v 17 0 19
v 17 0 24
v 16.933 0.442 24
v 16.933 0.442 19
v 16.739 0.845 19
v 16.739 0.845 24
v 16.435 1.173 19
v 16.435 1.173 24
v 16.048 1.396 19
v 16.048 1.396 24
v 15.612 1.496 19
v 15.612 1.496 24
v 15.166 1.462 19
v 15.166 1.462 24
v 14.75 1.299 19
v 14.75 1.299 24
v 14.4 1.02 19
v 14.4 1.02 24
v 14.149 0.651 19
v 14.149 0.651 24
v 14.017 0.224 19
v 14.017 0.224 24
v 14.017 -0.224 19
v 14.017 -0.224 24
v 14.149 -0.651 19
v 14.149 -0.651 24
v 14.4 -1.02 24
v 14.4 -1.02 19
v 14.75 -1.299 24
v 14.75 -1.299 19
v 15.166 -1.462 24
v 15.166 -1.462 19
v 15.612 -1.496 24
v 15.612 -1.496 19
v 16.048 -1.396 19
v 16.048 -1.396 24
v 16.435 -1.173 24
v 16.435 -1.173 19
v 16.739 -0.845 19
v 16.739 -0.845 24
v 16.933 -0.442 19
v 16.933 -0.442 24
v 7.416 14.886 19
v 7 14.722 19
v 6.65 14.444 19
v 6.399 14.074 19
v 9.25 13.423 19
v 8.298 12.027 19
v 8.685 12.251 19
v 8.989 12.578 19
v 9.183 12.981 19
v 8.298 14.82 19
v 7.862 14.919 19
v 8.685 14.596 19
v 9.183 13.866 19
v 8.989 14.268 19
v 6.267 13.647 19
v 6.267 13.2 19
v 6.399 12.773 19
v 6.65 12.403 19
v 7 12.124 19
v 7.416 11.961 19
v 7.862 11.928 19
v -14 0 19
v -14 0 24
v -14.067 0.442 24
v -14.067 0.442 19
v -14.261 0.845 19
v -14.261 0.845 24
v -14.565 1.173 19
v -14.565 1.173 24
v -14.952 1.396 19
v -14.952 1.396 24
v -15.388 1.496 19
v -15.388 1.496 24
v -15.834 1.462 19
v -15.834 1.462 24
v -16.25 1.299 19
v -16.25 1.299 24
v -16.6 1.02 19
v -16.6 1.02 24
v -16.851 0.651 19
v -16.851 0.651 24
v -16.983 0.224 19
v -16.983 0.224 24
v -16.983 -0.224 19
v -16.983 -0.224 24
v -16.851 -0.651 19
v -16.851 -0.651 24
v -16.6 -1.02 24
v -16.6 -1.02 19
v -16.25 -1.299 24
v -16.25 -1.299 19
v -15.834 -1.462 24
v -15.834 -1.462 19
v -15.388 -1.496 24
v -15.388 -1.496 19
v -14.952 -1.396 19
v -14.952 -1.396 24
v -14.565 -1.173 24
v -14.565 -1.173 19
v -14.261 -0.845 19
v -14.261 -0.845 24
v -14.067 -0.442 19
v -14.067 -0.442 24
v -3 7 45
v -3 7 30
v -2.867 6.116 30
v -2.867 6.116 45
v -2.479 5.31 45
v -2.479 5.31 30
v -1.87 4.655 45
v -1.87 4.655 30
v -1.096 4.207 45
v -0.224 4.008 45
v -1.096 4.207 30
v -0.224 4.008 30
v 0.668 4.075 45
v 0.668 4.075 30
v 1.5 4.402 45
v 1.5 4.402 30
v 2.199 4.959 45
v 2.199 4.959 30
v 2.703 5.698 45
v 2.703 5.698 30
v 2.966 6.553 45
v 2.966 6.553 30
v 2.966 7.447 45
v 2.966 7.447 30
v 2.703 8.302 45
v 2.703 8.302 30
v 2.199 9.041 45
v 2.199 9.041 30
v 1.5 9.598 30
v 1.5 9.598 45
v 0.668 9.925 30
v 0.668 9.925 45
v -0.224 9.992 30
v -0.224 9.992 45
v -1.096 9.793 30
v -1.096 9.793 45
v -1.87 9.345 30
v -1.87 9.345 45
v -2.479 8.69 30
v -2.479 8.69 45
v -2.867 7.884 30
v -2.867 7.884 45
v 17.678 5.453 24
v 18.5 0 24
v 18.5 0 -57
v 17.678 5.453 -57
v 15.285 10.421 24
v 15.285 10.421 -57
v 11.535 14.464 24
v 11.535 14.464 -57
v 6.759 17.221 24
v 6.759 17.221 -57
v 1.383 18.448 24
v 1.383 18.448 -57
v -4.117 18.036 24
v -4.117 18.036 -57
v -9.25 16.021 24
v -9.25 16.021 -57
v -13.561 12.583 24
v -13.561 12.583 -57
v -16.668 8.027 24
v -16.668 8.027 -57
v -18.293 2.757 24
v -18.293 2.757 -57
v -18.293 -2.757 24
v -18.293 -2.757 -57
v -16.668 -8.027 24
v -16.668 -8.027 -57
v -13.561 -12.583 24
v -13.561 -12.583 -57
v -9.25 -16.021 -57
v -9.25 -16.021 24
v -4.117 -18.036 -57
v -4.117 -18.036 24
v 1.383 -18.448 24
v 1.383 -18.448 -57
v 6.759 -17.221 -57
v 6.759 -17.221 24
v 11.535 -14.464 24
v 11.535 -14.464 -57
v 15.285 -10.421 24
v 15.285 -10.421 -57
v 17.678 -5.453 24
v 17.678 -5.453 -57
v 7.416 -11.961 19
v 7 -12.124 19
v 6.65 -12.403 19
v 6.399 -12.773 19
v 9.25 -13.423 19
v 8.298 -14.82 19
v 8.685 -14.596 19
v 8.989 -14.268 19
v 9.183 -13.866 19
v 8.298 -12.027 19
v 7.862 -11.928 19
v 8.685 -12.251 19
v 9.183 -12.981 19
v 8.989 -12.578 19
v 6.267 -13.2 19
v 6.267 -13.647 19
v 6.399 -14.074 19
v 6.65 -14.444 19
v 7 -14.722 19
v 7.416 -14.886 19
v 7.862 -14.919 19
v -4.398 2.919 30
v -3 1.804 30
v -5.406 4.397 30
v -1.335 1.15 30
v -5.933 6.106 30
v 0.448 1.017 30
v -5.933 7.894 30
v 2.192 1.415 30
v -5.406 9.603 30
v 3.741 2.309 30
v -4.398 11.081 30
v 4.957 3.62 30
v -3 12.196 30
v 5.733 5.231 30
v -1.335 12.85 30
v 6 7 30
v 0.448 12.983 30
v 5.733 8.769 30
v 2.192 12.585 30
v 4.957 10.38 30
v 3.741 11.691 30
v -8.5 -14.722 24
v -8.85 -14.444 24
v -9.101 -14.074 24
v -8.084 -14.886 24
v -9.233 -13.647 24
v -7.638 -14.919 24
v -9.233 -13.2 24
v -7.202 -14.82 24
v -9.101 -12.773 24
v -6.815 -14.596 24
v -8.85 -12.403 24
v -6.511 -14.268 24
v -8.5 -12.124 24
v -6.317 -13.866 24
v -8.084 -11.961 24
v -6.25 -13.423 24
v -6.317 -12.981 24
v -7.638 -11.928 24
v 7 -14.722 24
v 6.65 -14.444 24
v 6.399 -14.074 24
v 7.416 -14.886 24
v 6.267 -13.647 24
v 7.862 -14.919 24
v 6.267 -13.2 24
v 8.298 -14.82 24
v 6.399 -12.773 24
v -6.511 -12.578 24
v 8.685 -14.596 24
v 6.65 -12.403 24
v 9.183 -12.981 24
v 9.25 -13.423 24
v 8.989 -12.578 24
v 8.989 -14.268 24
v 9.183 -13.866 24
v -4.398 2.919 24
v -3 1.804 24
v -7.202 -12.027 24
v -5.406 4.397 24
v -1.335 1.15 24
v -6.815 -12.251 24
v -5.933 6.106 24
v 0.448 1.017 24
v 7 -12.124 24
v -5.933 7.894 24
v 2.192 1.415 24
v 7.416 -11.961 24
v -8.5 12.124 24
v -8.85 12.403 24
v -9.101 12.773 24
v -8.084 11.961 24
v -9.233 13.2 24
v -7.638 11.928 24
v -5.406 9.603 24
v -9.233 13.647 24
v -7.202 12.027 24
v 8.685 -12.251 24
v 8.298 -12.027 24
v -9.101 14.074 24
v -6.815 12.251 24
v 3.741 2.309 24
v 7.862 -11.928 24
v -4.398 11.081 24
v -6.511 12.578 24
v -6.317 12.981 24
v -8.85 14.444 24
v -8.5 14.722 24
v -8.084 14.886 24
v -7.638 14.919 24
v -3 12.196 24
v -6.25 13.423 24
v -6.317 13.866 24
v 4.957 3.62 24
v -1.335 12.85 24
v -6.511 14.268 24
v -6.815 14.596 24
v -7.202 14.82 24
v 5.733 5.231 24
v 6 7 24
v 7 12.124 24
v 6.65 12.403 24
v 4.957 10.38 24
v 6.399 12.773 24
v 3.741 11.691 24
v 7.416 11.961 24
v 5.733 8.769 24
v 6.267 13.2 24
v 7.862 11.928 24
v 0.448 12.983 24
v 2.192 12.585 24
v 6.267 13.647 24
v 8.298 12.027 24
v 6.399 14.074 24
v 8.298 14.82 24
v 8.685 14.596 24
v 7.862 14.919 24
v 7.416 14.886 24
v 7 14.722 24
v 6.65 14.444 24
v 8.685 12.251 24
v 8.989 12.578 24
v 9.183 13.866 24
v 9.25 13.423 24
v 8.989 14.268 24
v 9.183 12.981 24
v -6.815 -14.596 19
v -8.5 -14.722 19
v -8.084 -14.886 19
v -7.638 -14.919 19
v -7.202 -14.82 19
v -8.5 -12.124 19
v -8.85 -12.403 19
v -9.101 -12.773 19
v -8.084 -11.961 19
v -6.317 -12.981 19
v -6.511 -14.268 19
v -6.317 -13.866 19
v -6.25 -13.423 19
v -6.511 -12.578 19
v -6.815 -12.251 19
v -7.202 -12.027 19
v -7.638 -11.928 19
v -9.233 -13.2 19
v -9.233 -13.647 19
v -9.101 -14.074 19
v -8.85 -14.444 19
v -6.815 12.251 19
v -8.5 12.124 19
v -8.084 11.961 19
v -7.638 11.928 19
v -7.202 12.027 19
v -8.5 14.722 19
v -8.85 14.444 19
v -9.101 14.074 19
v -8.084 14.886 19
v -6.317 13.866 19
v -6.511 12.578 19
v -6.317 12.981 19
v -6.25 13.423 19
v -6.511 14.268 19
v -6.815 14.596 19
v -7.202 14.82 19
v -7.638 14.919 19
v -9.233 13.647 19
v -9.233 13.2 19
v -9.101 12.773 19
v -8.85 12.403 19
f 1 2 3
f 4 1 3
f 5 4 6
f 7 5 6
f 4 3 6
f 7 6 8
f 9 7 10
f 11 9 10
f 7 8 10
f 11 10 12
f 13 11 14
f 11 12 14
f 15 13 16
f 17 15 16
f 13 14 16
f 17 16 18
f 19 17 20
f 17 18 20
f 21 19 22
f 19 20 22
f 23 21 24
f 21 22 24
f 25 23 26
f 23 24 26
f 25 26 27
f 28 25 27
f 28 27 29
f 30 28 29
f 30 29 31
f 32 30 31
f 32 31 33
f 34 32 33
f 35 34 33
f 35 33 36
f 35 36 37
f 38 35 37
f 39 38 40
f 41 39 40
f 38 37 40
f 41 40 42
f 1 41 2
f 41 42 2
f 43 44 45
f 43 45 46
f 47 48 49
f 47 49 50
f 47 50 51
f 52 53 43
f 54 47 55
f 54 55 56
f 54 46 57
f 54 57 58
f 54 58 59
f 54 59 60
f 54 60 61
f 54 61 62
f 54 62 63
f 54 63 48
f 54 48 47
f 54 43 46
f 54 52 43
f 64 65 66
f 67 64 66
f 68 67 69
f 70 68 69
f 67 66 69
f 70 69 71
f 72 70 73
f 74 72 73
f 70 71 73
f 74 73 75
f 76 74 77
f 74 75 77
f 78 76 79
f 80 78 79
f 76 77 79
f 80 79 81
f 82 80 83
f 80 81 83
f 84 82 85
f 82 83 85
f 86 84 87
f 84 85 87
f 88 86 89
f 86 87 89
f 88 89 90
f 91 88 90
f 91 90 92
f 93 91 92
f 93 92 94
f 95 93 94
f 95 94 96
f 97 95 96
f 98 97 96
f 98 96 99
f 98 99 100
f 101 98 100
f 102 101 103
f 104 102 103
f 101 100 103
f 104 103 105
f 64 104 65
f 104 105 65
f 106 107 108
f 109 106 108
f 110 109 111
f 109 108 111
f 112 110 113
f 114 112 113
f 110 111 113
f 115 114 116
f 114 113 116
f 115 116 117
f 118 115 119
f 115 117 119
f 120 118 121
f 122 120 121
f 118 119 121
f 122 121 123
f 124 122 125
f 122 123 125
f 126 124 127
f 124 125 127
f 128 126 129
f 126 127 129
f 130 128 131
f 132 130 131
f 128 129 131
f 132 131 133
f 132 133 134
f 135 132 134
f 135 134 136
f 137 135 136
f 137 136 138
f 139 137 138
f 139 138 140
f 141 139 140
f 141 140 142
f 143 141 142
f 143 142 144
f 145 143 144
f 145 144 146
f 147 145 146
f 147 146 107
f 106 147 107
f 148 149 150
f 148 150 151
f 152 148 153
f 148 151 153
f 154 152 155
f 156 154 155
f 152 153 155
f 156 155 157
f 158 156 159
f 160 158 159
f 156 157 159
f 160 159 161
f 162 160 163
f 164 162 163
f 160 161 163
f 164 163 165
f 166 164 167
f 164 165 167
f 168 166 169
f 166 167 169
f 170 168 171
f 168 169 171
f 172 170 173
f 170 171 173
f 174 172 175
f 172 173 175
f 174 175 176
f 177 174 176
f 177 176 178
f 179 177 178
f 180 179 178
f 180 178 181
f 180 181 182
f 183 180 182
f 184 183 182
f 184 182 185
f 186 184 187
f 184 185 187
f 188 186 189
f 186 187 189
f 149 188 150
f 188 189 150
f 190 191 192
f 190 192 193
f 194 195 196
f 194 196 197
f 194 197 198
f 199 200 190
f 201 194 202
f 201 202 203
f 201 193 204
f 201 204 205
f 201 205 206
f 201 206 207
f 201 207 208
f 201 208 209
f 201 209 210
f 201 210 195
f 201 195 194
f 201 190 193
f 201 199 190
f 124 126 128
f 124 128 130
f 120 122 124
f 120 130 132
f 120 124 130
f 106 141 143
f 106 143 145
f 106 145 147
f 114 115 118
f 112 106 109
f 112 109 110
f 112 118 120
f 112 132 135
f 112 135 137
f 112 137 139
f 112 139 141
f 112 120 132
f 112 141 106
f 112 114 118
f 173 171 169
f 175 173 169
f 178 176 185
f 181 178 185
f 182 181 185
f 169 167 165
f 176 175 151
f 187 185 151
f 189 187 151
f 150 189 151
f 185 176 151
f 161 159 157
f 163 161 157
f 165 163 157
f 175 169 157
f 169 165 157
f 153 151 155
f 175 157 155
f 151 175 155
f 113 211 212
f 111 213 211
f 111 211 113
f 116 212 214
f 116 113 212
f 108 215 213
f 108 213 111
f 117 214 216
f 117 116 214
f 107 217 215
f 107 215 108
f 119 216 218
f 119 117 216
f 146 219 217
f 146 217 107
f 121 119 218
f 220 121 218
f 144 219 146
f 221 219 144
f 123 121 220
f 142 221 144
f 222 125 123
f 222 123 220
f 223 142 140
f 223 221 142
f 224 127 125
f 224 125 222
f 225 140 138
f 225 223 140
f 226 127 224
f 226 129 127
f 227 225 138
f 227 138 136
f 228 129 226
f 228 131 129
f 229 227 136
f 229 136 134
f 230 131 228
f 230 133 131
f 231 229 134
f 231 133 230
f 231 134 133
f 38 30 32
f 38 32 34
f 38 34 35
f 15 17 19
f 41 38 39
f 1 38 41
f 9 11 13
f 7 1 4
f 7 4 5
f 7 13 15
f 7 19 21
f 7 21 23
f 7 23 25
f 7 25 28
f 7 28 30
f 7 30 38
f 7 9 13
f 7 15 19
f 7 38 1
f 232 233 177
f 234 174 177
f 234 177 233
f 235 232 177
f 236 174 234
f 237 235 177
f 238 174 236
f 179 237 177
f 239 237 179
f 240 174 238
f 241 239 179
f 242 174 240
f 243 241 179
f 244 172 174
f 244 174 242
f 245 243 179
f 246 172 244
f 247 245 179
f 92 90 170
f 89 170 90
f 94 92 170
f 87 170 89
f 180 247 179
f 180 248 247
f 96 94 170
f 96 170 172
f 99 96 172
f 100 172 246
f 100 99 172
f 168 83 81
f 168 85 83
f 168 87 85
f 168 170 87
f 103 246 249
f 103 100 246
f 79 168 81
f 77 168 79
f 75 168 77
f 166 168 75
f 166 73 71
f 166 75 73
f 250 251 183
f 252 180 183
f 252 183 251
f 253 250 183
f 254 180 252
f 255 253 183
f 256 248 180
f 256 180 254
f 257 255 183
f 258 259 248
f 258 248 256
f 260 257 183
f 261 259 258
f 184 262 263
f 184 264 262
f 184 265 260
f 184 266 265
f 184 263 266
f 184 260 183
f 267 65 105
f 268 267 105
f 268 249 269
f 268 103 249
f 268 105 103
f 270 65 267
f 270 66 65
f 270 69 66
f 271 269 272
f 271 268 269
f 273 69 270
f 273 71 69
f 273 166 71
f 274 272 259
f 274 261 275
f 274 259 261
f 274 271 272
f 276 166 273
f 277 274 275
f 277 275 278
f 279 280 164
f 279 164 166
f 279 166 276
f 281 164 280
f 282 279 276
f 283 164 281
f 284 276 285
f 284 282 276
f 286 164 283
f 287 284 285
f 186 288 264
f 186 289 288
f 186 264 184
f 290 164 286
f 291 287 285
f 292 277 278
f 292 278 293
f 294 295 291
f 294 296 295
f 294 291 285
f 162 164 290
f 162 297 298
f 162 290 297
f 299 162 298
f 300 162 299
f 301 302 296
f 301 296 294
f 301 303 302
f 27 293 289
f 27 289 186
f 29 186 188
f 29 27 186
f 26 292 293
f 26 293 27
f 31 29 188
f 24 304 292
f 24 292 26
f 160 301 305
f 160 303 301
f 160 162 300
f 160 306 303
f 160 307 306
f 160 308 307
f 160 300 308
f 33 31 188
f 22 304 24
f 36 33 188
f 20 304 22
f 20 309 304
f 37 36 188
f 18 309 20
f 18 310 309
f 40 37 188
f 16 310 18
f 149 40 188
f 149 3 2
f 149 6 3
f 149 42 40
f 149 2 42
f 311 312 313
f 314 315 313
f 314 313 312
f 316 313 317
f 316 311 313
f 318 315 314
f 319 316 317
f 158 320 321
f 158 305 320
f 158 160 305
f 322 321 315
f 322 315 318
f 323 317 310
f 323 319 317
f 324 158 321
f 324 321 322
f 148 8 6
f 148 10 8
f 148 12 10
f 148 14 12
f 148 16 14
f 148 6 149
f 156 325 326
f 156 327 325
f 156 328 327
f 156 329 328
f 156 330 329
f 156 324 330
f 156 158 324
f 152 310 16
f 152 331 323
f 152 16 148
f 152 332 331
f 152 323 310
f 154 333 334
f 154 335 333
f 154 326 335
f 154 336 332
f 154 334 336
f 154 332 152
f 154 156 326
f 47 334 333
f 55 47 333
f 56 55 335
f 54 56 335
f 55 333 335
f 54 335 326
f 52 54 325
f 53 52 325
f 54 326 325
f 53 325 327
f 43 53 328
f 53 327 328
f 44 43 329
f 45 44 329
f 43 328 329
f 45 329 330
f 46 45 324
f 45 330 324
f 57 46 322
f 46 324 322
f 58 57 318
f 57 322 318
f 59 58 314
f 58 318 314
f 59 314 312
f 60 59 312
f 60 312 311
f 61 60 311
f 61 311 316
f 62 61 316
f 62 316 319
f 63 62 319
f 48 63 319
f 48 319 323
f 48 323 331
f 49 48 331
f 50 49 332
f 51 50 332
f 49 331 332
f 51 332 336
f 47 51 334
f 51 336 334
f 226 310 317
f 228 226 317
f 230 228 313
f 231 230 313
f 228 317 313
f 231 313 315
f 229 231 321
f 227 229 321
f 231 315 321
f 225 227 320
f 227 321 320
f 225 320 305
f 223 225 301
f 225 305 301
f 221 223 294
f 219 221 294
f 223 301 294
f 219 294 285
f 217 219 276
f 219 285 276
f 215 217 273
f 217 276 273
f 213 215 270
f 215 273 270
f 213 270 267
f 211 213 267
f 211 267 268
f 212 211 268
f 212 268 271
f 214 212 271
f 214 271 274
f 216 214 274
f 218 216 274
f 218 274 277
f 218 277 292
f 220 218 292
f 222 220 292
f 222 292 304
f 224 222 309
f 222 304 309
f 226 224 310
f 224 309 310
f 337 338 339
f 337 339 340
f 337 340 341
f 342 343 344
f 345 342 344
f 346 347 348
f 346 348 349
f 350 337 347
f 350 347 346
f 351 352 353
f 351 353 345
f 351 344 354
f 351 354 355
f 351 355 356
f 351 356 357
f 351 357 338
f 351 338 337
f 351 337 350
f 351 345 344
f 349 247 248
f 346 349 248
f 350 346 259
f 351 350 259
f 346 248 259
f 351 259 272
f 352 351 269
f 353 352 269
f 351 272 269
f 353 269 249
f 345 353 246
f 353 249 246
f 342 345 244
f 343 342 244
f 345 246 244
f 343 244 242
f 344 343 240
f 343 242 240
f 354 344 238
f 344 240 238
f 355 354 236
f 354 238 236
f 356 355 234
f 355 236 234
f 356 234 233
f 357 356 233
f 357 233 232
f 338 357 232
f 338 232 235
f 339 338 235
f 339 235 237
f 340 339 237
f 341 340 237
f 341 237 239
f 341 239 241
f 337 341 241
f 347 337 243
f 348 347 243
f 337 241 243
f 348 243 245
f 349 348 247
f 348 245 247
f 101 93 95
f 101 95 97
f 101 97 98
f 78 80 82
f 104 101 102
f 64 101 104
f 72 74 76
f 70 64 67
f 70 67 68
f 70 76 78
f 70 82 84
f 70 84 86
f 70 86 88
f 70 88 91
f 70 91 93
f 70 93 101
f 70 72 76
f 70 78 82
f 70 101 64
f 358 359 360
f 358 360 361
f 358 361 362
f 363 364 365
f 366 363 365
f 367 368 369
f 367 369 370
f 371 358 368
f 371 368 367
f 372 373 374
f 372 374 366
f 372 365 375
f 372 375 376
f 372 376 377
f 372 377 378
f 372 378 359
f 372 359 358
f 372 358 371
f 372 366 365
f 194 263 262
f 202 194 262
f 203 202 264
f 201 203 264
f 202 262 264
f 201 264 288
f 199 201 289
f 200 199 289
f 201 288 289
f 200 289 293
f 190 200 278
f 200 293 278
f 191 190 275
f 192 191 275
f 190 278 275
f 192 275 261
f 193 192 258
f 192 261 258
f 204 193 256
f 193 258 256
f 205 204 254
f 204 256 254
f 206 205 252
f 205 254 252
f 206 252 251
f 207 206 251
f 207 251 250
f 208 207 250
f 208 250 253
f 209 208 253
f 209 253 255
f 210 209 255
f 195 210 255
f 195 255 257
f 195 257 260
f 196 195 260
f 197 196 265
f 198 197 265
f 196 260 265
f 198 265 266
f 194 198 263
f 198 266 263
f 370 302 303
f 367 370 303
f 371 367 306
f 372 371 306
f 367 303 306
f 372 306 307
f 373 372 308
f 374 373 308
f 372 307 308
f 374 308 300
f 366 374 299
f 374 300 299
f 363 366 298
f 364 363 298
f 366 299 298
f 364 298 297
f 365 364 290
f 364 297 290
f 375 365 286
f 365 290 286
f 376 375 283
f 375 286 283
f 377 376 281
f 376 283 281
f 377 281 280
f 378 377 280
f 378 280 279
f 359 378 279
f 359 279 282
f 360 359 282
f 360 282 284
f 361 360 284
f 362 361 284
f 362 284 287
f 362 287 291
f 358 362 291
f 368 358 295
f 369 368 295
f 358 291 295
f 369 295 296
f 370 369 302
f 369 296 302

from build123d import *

# Parameters (mm, degrees)
BOSS_EXTRUDE1_DEPTH      = 24
BOSS_EXTRUDE1_DEPTH_BACK = 57
SKETCH1_R                = 18.5
SKETCH2_R                = 1.5
CUT_EXTRUDE1_DEPTH       = 5
SKETCH3_R                = 6
SKETCH3_R_2              = 3
BOSS_EXTRUDE2_DEPTH      = 6
SKETCH3_2_R              = 3
BOSS_EXTRUDE3_DEPTH      = 21


with BuildPart() as part:
    # Sketch1 → Boss-Extrude1 (new, two sides: drawn at the far end of the back side and taken through both)
    with BuildSketch(Plane.XY.offset(-BOSS_EXTRUDE1_DEPTH_BACK)):
        Circle(SKETCH1_R)
    extrude(amount=BOSS_EXTRUDE1_DEPTH + BOSS_EXTRUDE1_DEPTH_BACK)

    # Sketch2 → Cut-Extrude1 (cut)
    with BuildSketch(Plane.XY.offset(24)):
        with Locations((15.5, 0)):
            Circle(SKETCH2_R)
        with Locations((7.75, -13.423393759)):
            Circle(SKETCH2_R)
        with Locations((-7.75, -13.423393759)):
            Circle(SKETCH2_R)
        with Locations((-15.5, 0)):
            Circle(SKETCH2_R)
        with Locations((-7.75, 13.423393759)):
            Circle(SKETCH2_R)
        with Locations((7.75, 13.423393759)):
            Circle(SKETCH2_R)
    extrude(amount=-CUT_EXTRUDE1_DEPTH, mode=Mode.SUBTRACT)

    # Sketch3 → Boss-Extrude2 (add)
    with BuildSketch(Plane.XY.offset(24)):
        with Locations((0, 7)):
            Circle(SKETCH3_R)
        with Locations((0, 7)):
            Circle(SKETCH3_R_2, mode=Mode.SUBTRACT)
    extrude(amount=BOSS_EXTRUDE2_DEPTH)

    # Sketch3<2> → Boss-Extrude3 (add)
    with BuildSketch(Plane.XY.offset(24)):
        with Locations((0, 7)):
            Circle(SKETCH3_2_R)
    extrude(amount=BOSS_EXTRUDE3_DEPTH)


solid = part.part
